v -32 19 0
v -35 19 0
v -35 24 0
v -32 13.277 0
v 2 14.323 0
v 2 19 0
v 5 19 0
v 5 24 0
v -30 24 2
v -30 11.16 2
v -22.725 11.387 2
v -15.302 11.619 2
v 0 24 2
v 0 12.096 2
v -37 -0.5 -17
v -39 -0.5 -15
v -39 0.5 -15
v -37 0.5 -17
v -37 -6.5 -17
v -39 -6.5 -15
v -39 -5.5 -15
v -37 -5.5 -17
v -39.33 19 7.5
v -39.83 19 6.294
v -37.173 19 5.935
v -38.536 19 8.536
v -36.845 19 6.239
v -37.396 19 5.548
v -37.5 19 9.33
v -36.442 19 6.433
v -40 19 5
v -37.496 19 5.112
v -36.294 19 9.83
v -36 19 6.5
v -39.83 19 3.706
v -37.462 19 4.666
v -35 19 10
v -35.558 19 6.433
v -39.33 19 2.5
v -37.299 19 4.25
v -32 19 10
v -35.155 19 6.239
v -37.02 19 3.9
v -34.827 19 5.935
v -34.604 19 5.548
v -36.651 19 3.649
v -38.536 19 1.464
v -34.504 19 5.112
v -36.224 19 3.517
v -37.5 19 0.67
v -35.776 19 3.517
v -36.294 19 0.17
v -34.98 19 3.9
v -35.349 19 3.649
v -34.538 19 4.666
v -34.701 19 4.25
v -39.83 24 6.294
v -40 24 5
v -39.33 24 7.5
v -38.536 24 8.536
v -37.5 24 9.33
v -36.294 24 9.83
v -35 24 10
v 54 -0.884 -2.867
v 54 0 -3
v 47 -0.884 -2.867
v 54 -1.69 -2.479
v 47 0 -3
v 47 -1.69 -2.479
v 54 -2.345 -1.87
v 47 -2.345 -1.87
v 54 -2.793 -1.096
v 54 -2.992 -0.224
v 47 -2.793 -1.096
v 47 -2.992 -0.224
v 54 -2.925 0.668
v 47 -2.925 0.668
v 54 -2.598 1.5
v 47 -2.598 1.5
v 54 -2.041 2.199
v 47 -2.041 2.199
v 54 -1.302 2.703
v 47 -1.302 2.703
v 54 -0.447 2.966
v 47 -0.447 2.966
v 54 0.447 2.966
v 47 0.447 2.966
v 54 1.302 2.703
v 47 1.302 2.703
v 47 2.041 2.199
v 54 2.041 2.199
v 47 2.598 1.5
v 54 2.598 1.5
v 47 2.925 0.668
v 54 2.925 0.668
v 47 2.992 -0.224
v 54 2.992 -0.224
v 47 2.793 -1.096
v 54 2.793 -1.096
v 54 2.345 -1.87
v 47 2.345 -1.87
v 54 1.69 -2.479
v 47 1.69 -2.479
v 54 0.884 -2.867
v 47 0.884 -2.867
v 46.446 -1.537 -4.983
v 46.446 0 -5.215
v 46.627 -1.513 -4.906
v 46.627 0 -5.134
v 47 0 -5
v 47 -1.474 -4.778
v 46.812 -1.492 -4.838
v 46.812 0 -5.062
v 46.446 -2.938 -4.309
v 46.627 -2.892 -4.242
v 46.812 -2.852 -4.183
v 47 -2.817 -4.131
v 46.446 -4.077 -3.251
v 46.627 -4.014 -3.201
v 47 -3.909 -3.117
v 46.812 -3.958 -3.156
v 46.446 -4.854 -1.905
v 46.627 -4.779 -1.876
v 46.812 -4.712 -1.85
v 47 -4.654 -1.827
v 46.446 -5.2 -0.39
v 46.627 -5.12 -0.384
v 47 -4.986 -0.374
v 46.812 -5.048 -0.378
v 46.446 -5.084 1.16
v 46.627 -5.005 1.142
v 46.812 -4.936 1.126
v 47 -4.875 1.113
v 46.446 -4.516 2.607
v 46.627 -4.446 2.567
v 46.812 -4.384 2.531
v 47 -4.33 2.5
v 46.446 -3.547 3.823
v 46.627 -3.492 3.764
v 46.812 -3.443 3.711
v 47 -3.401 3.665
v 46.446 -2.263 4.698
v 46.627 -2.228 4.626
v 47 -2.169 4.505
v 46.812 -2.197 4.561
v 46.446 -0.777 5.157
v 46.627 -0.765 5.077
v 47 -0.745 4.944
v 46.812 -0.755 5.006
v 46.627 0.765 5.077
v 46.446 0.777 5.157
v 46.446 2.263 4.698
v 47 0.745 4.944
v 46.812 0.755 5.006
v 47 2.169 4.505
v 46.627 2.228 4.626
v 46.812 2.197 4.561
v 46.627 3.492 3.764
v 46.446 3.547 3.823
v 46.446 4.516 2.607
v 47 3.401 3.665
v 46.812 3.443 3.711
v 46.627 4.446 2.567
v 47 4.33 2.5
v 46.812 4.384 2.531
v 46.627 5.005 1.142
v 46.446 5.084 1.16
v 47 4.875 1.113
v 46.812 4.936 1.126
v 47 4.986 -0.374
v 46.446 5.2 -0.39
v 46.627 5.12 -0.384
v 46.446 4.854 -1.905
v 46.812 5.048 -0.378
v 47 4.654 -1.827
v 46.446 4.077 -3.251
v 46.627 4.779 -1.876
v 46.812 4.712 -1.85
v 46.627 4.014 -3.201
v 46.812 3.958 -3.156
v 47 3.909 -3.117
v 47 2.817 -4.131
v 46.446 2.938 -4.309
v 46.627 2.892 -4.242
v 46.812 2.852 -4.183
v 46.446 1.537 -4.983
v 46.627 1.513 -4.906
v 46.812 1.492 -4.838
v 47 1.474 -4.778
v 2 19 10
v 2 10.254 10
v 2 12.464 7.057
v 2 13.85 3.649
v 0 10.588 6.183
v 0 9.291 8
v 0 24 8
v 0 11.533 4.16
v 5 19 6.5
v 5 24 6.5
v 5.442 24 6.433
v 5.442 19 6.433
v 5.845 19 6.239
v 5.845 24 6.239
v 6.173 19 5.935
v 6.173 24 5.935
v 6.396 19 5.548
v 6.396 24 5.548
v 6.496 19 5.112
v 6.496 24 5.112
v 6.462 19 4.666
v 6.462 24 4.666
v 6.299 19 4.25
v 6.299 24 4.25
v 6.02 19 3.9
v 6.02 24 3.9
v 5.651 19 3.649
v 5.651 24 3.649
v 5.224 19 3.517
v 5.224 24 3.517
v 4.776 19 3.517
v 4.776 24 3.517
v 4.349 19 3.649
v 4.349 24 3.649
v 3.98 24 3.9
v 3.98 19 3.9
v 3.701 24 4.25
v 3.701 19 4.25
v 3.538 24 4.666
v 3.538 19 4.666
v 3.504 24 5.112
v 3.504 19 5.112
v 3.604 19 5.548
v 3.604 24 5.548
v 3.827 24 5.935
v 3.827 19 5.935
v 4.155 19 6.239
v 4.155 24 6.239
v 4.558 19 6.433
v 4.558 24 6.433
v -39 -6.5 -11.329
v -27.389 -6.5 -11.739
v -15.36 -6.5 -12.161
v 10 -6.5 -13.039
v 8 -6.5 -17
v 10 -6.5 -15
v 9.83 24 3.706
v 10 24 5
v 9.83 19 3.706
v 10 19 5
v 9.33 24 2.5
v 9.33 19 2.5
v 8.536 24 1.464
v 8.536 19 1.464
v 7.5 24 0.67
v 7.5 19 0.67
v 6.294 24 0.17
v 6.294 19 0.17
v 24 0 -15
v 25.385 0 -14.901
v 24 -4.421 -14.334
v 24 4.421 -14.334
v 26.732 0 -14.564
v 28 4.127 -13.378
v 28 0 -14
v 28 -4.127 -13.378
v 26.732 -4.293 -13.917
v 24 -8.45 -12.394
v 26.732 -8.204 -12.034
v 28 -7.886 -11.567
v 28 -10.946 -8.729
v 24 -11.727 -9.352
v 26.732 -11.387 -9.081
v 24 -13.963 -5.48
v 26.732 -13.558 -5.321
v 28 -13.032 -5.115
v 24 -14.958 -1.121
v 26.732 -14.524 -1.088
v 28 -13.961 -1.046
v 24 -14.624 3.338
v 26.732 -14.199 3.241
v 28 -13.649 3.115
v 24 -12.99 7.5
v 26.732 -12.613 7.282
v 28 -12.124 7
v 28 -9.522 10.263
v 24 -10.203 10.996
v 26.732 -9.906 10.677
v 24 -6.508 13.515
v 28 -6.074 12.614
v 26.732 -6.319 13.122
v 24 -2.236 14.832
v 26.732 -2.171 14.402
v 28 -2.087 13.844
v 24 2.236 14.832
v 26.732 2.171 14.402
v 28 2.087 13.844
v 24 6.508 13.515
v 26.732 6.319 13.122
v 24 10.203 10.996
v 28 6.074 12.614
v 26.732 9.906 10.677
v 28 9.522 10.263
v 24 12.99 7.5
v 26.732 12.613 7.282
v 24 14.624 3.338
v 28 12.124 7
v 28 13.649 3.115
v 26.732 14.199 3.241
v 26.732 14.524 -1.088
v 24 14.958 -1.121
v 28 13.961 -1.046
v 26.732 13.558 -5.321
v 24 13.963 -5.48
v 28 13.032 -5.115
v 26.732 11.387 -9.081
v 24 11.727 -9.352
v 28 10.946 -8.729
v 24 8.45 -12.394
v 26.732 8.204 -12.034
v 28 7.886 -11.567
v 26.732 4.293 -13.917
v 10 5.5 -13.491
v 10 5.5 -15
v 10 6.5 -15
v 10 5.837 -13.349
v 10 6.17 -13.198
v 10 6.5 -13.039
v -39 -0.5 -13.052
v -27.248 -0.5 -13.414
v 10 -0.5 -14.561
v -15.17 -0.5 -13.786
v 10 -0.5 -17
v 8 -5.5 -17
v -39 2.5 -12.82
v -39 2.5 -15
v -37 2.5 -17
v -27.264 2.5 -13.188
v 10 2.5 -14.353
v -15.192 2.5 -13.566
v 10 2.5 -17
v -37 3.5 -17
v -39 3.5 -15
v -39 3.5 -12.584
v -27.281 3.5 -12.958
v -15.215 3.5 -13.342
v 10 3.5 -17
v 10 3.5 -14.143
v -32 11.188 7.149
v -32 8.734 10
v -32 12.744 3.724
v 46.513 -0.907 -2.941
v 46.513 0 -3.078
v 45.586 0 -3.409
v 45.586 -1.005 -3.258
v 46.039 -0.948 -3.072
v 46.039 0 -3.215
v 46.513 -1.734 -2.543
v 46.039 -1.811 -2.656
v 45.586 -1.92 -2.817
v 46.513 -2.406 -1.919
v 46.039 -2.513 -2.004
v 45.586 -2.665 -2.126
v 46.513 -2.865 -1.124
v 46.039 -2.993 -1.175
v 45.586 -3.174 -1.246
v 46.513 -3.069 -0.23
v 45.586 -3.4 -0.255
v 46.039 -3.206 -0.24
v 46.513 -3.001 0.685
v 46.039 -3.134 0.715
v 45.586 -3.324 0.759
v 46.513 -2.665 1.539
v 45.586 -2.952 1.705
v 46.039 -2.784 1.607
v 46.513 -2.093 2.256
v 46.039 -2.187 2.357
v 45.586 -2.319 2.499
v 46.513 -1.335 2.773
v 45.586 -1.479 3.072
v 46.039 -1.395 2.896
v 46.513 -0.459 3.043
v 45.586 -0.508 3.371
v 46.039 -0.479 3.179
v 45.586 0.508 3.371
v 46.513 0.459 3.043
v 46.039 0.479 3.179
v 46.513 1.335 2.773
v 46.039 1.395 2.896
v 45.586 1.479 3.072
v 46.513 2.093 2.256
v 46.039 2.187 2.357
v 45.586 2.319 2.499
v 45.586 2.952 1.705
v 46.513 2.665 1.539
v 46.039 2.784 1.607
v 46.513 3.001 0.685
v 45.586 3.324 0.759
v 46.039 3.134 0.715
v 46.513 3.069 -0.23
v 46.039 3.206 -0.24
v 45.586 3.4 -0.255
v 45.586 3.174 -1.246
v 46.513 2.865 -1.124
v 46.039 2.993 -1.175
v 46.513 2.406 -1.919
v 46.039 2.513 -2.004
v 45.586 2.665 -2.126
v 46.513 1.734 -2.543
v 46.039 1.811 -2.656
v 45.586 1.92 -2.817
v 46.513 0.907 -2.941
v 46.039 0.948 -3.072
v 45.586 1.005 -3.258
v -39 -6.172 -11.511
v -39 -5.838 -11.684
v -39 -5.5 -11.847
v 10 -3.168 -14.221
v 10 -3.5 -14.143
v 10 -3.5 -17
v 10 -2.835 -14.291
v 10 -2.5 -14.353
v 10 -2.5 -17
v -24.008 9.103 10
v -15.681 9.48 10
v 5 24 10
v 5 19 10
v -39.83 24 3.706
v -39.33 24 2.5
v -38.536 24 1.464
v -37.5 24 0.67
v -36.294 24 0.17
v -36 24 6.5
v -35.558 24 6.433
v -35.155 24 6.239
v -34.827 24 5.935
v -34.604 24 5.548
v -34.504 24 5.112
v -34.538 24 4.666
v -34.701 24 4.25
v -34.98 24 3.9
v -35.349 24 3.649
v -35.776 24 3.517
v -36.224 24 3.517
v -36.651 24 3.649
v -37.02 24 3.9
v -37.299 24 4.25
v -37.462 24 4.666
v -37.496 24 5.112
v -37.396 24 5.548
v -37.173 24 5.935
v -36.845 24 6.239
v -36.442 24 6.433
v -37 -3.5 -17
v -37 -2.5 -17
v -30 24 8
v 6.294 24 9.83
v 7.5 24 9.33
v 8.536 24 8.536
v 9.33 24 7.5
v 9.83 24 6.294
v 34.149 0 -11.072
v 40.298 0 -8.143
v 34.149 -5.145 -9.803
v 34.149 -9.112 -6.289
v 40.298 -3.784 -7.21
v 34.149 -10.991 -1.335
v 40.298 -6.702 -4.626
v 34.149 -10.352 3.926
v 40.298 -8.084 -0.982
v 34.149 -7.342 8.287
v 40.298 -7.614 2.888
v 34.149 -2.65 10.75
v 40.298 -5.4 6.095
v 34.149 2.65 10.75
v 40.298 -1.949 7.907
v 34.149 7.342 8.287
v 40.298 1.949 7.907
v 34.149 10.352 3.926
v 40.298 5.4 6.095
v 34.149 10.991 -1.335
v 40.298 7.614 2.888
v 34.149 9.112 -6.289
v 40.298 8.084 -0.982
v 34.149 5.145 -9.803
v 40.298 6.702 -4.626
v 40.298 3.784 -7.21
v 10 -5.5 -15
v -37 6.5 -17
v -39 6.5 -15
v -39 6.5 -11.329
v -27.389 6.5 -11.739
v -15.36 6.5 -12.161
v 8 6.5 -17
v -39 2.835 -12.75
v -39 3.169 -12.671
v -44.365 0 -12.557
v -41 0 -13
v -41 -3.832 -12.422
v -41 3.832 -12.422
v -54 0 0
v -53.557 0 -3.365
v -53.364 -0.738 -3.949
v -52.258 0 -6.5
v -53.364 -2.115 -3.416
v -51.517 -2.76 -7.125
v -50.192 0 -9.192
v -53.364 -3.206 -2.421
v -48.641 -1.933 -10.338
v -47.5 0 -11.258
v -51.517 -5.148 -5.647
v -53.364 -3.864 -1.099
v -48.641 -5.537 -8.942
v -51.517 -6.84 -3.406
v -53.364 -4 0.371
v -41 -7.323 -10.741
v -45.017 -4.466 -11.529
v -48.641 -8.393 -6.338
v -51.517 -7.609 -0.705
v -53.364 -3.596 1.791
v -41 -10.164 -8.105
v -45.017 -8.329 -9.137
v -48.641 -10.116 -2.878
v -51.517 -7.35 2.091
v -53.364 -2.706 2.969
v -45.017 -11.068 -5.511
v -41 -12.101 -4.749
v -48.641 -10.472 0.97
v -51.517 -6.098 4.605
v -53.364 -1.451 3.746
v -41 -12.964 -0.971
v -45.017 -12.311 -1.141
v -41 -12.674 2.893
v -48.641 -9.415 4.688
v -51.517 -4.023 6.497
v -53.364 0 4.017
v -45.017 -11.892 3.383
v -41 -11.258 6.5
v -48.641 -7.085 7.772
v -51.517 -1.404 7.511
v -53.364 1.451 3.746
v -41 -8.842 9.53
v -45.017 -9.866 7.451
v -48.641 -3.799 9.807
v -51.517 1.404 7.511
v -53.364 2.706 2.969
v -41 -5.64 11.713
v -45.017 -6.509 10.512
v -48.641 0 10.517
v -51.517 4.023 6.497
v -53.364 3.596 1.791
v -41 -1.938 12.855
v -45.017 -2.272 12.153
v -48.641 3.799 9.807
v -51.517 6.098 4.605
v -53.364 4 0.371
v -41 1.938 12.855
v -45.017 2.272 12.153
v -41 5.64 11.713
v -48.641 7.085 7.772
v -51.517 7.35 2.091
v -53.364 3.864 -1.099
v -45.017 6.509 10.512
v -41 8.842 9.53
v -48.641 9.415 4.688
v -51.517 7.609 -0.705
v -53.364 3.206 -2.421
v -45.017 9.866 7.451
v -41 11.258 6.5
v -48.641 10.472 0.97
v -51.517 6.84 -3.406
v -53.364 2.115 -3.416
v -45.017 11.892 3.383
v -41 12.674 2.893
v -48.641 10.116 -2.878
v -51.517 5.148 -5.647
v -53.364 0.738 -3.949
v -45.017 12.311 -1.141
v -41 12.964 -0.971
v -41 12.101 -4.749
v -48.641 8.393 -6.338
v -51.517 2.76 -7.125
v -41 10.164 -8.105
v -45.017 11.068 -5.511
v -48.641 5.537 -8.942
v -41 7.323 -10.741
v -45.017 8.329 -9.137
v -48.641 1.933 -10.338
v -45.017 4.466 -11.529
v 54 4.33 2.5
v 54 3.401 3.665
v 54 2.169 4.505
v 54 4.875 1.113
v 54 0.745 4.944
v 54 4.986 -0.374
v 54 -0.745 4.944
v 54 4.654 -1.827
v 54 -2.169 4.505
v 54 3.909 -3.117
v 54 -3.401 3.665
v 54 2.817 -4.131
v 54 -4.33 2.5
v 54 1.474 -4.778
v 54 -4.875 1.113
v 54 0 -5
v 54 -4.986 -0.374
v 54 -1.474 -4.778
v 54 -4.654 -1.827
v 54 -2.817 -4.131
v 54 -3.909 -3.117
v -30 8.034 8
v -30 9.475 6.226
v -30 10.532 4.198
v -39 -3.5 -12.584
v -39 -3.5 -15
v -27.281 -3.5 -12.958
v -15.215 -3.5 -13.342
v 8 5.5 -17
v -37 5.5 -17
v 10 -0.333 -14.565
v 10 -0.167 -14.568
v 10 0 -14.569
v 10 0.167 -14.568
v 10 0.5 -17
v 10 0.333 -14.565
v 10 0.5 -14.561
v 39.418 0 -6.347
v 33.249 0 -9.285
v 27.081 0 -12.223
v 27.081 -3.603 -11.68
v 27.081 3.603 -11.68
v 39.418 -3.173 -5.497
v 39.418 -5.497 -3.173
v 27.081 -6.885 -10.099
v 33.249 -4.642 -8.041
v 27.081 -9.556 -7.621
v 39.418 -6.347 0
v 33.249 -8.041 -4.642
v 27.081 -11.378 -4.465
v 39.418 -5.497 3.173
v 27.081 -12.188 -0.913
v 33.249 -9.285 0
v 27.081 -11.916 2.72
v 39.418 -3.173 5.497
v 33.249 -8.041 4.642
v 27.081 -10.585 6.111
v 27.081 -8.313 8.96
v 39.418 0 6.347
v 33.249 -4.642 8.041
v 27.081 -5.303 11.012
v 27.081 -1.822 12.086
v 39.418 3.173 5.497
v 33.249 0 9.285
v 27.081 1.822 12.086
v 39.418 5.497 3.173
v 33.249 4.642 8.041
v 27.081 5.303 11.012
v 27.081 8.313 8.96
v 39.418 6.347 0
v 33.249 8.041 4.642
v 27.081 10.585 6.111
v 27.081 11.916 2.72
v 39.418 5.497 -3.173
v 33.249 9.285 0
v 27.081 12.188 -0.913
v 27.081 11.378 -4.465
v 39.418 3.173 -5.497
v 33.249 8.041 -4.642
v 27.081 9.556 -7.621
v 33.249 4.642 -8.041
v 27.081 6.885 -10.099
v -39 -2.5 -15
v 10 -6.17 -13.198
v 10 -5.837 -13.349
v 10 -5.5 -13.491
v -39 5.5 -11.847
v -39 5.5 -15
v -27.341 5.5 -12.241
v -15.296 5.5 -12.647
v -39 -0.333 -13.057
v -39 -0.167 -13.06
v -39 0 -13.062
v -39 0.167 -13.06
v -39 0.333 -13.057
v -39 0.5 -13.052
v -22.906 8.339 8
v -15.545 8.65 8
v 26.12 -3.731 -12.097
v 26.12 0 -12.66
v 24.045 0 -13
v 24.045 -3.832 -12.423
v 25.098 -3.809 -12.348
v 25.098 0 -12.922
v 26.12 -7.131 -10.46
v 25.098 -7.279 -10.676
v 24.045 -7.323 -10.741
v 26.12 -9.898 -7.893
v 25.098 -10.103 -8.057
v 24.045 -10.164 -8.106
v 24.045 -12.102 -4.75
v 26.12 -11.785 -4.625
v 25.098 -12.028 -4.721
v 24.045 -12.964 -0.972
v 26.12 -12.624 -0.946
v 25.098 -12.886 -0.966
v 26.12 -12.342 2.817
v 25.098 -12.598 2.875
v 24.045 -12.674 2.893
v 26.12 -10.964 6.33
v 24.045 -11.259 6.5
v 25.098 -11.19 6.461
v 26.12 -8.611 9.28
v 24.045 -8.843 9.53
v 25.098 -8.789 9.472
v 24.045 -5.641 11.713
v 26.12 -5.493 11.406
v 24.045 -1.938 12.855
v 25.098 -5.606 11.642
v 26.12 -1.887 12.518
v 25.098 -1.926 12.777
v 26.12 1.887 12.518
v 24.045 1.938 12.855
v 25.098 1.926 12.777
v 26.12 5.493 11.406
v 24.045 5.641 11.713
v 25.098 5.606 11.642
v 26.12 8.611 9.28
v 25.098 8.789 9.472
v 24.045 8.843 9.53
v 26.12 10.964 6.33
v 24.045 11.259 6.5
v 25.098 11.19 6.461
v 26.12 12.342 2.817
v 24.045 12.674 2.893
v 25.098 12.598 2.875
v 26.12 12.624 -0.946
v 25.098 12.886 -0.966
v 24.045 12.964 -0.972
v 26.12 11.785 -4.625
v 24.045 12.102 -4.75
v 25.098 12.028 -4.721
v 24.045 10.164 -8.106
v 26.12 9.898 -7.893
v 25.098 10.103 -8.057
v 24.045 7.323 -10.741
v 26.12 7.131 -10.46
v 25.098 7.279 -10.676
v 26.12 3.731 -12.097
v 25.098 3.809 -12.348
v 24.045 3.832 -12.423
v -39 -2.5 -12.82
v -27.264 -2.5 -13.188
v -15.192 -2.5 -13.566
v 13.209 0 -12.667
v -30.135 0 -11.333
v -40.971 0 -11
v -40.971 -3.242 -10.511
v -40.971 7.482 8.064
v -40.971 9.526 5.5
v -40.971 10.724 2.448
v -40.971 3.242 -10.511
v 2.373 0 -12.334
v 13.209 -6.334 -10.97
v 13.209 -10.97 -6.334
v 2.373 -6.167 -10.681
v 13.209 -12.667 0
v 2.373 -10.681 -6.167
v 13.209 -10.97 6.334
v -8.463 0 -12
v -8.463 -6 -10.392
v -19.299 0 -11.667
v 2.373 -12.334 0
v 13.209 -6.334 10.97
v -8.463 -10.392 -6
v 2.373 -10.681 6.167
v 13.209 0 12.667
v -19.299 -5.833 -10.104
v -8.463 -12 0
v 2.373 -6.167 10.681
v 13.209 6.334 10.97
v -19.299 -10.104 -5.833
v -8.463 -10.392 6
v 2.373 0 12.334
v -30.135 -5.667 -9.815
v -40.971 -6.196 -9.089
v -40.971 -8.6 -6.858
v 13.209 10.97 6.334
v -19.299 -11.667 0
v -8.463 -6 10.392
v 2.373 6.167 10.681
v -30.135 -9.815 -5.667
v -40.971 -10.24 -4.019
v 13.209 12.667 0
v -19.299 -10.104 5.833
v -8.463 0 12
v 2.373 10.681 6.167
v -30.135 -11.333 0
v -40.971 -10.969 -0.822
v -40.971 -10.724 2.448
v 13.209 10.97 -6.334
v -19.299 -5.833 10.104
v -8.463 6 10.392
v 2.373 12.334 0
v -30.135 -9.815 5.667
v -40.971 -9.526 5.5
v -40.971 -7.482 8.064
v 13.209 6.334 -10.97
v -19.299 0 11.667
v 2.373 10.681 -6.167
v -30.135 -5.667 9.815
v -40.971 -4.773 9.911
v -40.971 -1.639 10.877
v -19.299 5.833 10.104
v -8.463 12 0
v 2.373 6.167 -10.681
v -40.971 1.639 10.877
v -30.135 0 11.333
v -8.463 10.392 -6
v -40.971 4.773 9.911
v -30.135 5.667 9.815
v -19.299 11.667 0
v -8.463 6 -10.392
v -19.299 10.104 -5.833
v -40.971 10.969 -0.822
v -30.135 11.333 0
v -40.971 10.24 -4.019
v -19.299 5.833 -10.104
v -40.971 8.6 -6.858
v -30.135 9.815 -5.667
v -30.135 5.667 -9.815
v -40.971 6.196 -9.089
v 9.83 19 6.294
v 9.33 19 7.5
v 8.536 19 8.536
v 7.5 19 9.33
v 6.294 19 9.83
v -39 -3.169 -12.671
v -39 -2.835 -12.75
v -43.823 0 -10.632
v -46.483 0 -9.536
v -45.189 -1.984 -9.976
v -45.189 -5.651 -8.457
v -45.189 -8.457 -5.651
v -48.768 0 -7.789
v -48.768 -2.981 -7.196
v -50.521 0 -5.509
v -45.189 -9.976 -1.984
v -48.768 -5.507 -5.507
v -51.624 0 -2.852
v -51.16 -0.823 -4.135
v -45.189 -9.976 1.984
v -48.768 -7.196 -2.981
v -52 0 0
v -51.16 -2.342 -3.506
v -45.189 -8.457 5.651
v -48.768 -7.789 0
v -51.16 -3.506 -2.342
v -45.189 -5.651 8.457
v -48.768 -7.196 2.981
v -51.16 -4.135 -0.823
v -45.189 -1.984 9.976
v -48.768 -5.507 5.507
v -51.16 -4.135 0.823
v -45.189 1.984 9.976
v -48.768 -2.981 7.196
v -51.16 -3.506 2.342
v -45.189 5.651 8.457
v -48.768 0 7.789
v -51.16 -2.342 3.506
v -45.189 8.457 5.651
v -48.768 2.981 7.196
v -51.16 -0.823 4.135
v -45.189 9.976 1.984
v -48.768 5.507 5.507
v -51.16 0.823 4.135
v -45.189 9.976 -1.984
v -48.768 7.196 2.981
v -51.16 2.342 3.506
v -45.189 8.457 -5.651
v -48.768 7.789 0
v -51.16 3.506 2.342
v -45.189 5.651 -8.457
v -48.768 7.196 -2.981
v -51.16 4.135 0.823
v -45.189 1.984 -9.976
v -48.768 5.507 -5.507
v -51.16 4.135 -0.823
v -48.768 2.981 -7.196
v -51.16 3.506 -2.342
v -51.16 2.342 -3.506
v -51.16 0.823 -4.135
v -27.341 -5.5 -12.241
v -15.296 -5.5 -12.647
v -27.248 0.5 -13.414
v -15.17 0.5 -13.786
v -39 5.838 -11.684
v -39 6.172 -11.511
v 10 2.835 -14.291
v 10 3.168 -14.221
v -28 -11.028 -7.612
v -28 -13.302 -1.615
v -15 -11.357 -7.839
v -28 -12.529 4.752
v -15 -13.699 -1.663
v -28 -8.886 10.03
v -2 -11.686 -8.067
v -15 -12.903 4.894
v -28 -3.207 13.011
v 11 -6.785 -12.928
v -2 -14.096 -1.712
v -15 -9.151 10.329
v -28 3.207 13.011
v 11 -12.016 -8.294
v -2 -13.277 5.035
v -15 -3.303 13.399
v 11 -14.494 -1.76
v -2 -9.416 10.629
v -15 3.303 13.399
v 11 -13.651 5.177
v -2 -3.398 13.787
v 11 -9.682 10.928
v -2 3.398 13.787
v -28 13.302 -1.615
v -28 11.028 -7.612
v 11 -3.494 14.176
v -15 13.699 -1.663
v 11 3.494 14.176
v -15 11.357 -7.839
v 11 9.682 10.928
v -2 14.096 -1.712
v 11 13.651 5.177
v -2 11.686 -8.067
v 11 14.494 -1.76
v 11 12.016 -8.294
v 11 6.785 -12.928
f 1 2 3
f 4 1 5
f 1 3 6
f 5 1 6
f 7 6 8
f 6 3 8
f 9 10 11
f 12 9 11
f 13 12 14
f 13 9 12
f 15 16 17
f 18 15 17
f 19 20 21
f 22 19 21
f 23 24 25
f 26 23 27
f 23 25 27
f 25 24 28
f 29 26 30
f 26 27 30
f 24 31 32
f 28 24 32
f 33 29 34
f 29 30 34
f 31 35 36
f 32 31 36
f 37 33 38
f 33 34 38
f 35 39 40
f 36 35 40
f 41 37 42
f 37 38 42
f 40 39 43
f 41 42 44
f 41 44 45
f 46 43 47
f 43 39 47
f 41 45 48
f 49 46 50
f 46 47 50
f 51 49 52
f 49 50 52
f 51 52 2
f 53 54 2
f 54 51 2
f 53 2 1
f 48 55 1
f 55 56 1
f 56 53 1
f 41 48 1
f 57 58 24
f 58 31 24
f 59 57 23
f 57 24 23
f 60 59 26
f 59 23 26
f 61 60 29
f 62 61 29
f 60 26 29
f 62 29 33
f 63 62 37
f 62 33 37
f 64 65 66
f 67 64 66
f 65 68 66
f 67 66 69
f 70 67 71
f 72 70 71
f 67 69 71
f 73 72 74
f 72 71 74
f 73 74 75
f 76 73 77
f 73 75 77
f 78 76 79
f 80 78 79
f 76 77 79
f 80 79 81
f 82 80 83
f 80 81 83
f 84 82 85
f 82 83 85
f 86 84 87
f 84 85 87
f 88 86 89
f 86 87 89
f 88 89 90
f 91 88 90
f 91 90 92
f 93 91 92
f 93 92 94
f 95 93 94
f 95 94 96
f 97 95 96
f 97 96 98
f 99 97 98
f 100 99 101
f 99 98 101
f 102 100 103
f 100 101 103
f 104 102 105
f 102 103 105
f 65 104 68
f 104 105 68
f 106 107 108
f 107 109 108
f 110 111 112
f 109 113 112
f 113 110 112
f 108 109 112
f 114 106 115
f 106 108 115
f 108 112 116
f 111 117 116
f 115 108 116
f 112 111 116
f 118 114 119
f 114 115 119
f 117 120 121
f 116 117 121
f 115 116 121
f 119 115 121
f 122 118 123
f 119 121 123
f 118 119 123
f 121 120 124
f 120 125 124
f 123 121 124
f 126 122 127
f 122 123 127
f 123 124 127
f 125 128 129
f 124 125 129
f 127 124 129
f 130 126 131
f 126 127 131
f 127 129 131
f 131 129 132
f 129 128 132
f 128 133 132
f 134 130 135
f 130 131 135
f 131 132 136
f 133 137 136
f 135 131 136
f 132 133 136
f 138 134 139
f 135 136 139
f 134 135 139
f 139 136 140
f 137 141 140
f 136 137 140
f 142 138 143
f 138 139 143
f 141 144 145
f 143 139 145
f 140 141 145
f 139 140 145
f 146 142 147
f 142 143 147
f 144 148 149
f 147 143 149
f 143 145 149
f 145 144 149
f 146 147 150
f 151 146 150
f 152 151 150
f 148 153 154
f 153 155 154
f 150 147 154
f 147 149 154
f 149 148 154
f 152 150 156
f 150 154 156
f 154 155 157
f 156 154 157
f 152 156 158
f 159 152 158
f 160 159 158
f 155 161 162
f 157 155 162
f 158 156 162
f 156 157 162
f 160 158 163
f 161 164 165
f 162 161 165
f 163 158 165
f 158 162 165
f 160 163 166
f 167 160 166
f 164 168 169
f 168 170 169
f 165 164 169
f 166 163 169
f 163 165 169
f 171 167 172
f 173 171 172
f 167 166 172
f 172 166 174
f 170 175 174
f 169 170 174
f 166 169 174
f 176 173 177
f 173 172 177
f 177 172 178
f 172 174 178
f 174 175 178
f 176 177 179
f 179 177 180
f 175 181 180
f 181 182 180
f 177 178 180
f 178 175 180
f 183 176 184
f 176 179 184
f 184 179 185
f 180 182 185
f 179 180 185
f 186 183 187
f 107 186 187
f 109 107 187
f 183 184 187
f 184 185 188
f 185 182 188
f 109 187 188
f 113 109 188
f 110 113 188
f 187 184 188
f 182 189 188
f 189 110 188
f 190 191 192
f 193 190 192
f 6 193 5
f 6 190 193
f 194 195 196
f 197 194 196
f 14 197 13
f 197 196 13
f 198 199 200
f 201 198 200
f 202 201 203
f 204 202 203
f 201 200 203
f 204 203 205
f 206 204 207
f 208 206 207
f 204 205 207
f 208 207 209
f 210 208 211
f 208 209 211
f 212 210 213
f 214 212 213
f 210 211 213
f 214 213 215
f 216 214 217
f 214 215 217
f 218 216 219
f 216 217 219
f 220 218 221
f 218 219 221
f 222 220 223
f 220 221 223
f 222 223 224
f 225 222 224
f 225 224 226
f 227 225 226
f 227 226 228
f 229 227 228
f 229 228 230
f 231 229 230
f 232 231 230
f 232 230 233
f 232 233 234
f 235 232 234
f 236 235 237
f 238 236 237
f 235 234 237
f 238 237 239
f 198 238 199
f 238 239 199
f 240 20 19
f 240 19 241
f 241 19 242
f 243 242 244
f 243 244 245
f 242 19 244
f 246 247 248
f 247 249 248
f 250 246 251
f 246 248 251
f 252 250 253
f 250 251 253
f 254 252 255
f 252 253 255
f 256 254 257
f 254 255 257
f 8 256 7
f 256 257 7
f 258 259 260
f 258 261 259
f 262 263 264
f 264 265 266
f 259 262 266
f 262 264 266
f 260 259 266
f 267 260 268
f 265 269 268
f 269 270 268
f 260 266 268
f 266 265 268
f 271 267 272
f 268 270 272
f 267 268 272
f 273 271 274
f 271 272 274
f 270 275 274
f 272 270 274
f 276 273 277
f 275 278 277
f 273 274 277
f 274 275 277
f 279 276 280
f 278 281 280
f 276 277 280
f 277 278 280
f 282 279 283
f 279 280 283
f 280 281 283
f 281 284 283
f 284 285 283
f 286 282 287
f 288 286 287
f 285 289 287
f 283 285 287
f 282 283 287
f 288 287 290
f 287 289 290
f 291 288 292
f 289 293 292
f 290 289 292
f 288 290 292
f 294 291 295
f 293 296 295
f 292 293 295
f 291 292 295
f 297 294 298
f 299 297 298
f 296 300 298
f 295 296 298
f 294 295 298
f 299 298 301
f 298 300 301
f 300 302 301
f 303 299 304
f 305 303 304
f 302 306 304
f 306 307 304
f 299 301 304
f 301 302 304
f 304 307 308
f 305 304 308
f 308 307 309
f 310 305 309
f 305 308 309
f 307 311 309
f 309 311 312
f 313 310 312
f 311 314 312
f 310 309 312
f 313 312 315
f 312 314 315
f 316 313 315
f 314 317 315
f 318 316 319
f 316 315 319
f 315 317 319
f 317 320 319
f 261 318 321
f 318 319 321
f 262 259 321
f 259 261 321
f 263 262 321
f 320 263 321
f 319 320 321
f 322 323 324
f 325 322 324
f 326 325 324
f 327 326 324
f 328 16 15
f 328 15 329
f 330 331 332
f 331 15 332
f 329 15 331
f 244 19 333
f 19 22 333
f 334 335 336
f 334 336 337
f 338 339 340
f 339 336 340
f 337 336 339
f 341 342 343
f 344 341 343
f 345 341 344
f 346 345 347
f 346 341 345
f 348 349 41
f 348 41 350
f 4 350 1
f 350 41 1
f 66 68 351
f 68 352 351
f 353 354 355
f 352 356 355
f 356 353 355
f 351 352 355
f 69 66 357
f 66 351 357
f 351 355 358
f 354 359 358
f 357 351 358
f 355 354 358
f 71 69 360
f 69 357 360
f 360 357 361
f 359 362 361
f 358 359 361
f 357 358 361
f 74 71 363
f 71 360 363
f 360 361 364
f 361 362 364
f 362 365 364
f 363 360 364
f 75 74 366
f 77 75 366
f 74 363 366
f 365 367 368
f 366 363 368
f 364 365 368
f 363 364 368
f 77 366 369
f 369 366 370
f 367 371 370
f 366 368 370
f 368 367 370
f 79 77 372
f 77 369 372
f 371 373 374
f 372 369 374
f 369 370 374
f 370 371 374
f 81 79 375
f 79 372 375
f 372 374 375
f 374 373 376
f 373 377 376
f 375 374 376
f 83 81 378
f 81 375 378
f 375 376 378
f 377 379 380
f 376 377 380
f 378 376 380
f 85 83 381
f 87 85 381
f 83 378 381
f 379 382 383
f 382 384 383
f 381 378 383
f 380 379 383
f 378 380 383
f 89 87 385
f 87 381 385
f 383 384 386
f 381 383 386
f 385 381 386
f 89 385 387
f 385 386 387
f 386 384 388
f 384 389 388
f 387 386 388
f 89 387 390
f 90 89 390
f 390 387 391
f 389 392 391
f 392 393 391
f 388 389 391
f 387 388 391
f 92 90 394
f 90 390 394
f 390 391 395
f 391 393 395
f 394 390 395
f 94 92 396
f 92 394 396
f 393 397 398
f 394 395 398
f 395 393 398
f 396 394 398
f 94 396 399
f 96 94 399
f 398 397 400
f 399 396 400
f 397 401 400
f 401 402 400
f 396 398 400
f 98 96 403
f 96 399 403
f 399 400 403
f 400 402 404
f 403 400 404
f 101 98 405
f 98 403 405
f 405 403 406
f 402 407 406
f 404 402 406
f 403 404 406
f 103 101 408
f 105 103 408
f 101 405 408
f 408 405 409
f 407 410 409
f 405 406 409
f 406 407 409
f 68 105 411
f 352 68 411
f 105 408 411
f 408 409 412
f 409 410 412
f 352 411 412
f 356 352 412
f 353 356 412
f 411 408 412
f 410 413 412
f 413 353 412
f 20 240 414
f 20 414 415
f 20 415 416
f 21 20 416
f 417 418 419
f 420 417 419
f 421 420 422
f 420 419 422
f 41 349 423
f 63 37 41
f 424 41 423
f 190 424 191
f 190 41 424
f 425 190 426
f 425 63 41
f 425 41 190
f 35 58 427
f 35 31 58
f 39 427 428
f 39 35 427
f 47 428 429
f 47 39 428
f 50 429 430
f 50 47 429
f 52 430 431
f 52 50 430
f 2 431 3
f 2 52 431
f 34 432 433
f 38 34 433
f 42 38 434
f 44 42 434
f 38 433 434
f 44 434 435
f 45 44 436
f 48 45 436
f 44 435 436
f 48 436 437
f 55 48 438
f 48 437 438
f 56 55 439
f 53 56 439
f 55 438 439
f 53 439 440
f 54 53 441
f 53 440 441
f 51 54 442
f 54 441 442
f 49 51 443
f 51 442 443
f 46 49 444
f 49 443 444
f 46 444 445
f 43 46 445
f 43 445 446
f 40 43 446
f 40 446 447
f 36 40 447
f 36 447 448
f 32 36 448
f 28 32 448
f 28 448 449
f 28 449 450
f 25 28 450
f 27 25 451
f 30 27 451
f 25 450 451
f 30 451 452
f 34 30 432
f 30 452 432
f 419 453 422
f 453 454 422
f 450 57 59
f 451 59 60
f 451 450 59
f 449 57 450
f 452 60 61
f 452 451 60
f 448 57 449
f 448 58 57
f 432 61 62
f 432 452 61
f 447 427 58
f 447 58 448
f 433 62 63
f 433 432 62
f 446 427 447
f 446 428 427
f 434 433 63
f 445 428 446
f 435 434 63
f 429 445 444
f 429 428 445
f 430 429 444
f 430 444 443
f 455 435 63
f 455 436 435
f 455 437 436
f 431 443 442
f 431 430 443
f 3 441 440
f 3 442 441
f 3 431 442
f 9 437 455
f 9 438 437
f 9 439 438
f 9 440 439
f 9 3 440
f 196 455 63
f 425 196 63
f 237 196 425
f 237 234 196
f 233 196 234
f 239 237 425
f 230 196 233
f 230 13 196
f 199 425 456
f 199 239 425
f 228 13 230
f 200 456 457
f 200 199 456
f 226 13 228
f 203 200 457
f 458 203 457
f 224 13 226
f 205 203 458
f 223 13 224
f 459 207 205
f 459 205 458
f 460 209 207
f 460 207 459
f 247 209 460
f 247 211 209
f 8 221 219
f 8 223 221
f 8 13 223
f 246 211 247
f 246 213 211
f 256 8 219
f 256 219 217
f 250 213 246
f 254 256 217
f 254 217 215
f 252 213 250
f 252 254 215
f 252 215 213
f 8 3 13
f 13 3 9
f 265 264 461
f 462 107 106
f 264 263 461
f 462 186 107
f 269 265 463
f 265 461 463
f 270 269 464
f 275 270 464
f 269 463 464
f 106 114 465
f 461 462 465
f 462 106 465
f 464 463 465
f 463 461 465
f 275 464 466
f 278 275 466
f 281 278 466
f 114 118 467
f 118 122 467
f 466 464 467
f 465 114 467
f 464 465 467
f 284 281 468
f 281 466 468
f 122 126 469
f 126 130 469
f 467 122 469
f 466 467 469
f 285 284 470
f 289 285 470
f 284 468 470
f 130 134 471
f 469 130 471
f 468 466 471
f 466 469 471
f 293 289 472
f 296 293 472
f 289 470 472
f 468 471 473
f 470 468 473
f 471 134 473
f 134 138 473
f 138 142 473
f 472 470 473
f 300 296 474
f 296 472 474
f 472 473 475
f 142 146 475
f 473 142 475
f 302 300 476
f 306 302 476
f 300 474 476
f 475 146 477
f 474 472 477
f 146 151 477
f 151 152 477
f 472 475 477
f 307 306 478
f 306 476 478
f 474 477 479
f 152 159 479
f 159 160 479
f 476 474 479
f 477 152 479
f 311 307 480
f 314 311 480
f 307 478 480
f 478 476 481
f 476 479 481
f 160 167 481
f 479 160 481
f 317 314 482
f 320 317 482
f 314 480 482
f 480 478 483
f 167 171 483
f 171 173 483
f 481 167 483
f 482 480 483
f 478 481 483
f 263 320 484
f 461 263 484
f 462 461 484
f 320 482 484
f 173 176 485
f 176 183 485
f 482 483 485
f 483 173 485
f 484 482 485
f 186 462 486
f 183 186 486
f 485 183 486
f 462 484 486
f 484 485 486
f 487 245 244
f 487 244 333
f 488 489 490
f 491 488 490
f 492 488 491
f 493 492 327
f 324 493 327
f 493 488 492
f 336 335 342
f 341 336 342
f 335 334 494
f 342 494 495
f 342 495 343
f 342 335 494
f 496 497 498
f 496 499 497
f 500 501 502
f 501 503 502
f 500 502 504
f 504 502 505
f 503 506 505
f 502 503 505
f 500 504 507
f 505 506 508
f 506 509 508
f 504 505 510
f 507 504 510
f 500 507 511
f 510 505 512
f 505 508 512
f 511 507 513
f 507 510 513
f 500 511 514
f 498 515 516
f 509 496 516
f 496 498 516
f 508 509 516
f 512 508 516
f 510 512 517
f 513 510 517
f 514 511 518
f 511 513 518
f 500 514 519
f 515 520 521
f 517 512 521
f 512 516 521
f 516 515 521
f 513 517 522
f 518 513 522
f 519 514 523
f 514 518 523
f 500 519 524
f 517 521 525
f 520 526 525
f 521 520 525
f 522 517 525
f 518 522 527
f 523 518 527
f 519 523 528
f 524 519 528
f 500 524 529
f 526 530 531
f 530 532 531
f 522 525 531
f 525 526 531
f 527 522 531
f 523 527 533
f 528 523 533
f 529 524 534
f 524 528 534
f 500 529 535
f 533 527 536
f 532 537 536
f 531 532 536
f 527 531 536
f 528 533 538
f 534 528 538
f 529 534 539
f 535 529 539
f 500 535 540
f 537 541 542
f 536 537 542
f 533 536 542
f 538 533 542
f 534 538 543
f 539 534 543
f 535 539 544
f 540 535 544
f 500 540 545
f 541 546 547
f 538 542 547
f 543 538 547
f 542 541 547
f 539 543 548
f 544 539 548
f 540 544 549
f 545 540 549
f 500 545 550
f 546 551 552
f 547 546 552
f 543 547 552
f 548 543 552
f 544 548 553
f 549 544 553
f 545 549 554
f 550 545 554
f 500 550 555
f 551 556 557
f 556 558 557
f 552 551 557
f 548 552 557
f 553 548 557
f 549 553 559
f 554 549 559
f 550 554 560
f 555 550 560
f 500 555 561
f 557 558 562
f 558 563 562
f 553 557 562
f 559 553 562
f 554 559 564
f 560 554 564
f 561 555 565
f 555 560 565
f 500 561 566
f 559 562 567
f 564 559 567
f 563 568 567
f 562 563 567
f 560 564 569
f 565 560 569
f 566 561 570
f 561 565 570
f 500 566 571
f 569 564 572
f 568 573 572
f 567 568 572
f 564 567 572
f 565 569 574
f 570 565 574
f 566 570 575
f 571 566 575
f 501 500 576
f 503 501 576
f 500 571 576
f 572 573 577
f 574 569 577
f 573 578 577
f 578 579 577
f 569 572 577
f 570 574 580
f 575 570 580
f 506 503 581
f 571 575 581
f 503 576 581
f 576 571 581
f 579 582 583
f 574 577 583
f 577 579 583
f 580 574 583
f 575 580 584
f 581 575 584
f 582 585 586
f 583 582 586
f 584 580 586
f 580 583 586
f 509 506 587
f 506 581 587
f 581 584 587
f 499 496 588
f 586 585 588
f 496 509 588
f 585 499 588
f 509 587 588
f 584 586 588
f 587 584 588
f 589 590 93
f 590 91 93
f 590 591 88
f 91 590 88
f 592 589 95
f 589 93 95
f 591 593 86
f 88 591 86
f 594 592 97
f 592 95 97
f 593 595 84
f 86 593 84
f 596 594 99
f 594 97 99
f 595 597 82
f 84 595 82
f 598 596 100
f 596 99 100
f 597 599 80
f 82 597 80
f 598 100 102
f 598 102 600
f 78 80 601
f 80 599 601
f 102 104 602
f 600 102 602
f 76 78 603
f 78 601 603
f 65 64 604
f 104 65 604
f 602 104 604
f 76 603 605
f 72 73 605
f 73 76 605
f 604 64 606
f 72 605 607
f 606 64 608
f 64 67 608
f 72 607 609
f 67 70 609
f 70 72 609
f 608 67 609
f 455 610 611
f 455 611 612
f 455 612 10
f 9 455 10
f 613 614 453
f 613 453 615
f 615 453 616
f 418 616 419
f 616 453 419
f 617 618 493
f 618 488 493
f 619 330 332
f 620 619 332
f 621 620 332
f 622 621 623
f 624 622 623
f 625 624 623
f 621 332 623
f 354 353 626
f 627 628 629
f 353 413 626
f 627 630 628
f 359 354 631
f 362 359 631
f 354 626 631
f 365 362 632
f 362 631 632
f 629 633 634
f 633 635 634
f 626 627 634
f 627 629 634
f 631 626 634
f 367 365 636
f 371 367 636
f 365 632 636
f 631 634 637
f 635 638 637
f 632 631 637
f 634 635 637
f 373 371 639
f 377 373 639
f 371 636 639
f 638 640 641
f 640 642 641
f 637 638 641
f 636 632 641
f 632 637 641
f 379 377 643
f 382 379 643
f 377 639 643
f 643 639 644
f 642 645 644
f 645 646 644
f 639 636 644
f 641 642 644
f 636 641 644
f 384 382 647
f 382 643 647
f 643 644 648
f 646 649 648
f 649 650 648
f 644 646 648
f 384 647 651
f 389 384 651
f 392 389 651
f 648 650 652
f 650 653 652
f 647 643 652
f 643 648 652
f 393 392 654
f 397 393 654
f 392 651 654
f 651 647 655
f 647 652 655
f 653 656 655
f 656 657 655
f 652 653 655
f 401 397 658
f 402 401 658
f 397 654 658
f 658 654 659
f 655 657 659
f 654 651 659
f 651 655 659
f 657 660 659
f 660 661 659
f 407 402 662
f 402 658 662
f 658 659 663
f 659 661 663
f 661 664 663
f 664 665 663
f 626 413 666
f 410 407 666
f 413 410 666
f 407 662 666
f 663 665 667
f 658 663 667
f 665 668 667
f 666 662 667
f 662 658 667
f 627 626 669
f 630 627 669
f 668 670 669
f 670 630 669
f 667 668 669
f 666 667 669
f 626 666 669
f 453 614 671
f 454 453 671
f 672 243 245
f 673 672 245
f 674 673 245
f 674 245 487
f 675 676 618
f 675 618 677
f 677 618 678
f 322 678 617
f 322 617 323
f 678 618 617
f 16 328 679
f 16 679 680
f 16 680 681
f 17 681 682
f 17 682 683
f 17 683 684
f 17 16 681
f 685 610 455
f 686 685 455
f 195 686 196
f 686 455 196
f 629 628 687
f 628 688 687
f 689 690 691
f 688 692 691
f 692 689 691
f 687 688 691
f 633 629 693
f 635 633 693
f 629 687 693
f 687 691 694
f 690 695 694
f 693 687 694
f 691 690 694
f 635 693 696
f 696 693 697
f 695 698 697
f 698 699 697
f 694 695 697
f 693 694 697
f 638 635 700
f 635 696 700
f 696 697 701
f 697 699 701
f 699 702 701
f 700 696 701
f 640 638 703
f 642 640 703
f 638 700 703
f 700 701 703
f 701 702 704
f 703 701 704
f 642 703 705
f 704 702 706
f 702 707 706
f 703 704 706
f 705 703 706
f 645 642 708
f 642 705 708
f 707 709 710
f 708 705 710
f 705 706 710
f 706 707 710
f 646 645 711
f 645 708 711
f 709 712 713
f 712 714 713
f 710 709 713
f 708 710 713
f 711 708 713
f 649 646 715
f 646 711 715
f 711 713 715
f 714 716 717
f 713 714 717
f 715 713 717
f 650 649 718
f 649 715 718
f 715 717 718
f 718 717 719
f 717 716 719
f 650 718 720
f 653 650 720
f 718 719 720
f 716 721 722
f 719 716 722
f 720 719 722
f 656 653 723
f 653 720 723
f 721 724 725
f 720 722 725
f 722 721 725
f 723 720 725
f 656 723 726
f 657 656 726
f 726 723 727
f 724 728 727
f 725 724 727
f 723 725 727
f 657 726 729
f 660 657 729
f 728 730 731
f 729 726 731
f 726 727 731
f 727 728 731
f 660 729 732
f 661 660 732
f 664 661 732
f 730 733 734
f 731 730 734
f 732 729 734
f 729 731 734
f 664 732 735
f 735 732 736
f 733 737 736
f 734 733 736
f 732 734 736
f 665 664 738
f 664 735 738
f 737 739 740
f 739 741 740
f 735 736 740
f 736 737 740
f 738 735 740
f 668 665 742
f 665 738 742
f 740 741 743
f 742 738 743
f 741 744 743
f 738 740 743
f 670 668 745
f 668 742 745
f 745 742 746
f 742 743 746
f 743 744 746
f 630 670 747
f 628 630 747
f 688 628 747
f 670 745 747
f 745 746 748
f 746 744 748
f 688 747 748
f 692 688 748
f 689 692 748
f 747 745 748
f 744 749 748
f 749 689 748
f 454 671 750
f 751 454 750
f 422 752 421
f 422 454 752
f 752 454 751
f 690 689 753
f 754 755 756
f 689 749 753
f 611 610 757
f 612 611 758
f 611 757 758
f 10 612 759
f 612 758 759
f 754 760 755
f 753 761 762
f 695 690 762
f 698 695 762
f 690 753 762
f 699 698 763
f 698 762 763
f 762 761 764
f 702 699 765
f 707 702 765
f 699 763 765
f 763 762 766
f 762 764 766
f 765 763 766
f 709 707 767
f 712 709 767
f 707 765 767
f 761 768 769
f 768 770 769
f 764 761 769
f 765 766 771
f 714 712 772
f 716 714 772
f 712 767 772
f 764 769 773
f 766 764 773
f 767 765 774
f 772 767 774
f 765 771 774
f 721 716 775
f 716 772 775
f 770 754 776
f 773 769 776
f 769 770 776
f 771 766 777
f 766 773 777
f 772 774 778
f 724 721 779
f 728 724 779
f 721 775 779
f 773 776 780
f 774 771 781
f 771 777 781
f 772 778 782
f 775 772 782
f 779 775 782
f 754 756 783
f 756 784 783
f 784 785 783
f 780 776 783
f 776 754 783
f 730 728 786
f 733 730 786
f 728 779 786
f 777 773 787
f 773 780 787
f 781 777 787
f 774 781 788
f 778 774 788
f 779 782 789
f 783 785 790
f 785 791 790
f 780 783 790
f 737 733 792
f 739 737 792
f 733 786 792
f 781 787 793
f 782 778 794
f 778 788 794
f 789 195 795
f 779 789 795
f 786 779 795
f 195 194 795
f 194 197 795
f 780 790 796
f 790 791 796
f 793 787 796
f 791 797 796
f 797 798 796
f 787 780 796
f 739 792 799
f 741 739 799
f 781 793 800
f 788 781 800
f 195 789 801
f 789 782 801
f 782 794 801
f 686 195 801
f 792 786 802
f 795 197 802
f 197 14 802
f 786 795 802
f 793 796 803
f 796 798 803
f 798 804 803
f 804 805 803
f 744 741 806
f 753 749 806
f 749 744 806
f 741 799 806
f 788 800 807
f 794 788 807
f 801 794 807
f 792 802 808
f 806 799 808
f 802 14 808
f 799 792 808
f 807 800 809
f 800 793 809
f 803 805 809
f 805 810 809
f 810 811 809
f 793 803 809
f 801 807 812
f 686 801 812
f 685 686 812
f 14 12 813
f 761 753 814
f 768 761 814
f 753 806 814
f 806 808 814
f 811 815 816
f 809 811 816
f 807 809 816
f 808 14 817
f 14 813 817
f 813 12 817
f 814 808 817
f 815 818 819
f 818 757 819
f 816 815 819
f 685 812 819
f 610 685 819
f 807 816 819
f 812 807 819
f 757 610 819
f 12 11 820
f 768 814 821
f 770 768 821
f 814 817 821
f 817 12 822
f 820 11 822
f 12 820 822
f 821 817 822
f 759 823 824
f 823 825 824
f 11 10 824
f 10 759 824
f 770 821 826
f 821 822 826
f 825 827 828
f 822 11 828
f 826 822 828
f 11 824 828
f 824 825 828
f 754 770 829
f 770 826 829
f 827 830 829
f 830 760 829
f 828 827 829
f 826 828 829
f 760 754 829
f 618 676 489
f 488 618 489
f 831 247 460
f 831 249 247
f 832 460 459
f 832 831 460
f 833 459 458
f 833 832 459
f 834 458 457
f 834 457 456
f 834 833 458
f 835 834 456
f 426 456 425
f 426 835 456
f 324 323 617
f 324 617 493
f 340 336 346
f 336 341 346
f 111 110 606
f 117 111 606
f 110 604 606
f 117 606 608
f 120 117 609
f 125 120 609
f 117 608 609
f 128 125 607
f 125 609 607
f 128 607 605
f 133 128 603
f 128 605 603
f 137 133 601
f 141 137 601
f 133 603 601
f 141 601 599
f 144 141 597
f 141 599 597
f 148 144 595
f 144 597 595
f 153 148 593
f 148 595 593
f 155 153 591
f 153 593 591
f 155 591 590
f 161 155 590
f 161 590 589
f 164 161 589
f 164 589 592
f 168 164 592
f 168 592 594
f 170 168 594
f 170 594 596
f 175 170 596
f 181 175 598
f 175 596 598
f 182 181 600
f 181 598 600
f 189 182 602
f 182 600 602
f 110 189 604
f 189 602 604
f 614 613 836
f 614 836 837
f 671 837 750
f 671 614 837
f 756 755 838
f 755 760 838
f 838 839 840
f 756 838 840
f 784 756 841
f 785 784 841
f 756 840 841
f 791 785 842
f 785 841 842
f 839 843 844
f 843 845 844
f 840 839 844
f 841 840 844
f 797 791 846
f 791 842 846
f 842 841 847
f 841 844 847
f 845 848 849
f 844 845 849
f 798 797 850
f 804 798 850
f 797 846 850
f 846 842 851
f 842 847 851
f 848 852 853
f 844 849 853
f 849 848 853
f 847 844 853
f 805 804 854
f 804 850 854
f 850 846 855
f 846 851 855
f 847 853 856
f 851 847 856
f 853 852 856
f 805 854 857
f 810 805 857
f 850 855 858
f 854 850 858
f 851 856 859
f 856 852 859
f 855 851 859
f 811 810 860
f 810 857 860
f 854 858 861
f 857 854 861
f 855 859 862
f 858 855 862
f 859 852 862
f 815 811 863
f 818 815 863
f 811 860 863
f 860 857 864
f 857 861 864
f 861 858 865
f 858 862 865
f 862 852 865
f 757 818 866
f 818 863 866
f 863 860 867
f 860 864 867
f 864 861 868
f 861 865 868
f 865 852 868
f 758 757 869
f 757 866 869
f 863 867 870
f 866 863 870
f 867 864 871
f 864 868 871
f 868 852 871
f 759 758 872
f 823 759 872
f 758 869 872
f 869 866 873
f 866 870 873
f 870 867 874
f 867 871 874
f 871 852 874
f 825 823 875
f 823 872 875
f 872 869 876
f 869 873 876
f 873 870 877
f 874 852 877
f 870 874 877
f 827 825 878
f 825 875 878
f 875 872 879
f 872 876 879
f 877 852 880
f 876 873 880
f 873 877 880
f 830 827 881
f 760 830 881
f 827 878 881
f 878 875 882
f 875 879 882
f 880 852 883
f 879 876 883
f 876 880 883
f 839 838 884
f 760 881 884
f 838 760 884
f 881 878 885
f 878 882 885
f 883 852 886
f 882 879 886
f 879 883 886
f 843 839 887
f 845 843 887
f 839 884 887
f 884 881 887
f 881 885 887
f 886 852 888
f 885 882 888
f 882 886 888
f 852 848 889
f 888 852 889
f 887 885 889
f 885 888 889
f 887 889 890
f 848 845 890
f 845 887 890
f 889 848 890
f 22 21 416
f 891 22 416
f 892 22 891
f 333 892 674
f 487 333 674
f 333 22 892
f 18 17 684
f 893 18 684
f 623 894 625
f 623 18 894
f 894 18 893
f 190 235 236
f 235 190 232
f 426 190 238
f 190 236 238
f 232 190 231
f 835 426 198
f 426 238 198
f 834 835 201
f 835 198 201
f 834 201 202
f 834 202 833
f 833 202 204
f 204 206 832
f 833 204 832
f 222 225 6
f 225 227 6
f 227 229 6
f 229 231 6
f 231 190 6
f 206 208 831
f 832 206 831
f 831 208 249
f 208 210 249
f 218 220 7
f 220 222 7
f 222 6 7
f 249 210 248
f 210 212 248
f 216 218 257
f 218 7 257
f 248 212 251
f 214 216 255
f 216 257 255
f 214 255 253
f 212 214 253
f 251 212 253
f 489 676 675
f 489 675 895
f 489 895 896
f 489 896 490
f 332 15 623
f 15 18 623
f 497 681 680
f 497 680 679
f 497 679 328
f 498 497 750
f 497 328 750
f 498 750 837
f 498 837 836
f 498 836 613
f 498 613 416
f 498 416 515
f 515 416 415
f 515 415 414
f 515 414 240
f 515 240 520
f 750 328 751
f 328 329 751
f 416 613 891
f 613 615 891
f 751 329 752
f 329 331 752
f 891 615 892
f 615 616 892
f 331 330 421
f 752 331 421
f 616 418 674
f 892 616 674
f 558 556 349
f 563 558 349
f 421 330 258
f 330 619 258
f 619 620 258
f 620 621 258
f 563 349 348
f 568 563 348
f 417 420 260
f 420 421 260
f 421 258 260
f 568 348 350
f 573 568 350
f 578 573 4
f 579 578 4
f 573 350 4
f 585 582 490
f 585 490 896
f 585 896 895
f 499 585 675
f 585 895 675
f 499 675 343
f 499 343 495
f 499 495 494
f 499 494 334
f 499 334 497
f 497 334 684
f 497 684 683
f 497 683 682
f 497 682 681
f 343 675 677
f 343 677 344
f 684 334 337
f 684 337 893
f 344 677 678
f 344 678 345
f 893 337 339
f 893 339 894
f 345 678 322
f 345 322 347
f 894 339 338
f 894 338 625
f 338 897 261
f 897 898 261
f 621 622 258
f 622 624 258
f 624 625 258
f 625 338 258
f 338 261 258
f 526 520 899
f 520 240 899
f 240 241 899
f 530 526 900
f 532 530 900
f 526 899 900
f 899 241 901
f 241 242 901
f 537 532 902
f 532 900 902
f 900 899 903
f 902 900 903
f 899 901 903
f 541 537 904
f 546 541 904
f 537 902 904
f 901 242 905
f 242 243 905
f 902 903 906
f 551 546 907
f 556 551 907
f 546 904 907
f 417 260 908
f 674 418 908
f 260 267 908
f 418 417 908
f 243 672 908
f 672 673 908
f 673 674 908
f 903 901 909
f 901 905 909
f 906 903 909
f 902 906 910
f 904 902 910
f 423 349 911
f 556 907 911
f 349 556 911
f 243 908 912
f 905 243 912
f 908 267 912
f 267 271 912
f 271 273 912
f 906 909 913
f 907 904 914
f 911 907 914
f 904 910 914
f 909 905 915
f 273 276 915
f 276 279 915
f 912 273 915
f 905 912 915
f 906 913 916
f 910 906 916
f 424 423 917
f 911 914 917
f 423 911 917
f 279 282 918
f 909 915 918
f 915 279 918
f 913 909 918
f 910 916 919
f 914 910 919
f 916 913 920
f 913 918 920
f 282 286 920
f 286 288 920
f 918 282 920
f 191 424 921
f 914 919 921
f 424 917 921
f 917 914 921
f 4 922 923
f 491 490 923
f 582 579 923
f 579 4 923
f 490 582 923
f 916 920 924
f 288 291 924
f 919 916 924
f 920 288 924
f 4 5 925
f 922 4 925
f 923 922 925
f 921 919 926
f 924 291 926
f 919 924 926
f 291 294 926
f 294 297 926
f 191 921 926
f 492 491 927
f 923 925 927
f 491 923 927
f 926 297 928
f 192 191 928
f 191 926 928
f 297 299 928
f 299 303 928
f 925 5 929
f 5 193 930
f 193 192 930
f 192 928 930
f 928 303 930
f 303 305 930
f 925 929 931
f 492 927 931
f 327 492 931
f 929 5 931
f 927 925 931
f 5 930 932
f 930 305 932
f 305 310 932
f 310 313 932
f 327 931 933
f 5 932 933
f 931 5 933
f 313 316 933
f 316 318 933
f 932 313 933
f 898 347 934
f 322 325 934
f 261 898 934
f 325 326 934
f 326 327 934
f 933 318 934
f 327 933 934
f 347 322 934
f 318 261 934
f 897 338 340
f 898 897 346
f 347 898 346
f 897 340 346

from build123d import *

# Parameters (mm, degrees)
BOSS_EXTRUDE1_REACH = 70.28
SKETCH2_W           = 34
SKETCH2_H           = 10
SKETCH2_W_2         = 30
SKETCH2_H_2         = 6
SKETCH4_W           = 30
SKETCH4_H           = 6
CUT_EXTRUDE4_DEPTH  = 20
SKETCH5_W           = 50
SKETCH5_H           = 10
SKETCH5_R           = 1.5
SKETCH5_W_2         = 30
SKETCH5_H_2         = 6
BOSS_EXTRUDE2_DEPTH = 5
FILLET1_R           = 5
BOSS_EXTRUDE3_REACH = 69.202
SKETCH6_W           = 49
SKETCH6_H           = 1
CHAMFER1_SIZE       = 2


with BuildPart() as part:
    # Sketch1 → Revolve1 (revolve)
    with BuildSketch(Plane.XY, mode=Mode.PRIVATE) as revolve1_sk:
        with BuildLine():
            Line((-41, 13), (24, 15))
            ThreePointArc((24, 15), (26.065530114, 14.762120457), (28, 14))
            Line((28, 14), (46.44629603, 5.214864416))
            ThreePointArc((46.44629603, 5.214864416), (46.719154543, 5.09714106), (47, 5))
            Line((47, 5), (54, 5))
            Line((54, 5), (54, 3))
            Line((54, 3), (52, 3))
            Line((52, 3), (47, 3))
            ThreePointArc((47, 3), (46.274186419, 3.139019493), (45.586334306, 3.409188411))
            Line((45.586334306, 3.409188411), (27.080850933, 12.222512247))
            ThreePointArc((27.080850933, 12.222512247), (25.614773207, 12.813149248), (24.045329018, 13.000448217))
            Line((24.045329018, 13.000448217), (-40.970521752, 10.999960501))
            ThreePointArc((-40.970521752, 10.999960501), (-48.767745467, 7.788589754), (-52, 0))
            Line((-52, 0), (-54, 0))
            ThreePointArc((-54, 0), (-50.192388155, 9.192388155), (-41, 13))
        make_face()
    revolve(revolve1_sk.sketch.rotate(Axis((54, 0, 0), (-1, 0, 0)), 90), axis=Axis((54, 0, 0), (-1, 0, 0)))

    # Boss-Extrude1: up to this cone (the profile starts outside it)
    boss_extrude1_end = Plane(origin=(-15, 0, 0), z_dir=(1, 0, 0)) * Cone(11.197538462, 16.402461538, 169.16, mode=Mode.PRIVATE)
    # Sketch2 → Boss-Extrude1 (add, up to the surface)
    with BuildSketch(Plane(origin=(0, 24, 0), x_dir=(1, 0, 0), z_dir=(0, 1, 0)), mode=Mode.PRIVATE) as boss_extrude1_sk1:
        with Locations((-15, -5)):
            Rectangle(SKETCH2_W, SKETCH2_H)
        with Locations((-15, -5)):
            Rectangle(SKETCH2_W_2, SKETCH2_H_2, mode=Mode.SUBTRACT)
    boss_extrude1_tool1 = extrude(boss_extrude1_sk1.sketch, amount=-BOSS_EXTRUDE1_REACH, mode=Mode.PRIVATE) - boss_extrude1_end
    add(boss_extrude1_tool1.solids().sort_by_distance((-15, 24, 0.354401))[0])

    # Sketch4 → Cut-Extrude4 (cut)
    with BuildSketch(Plane(origin=(0, 24, 0), x_dir=(1, 0, 0), z_dir=(0, 1, 0))):
        with Locations((-15, -5)):
            Rectangle(SKETCH4_W, SKETCH4_H)
    extrude(amount=-CUT_EXTRUDE4_DEPTH, mode=Mode.SUBTRACT)

    # Sketch5 → Boss-Extrude2 (add)
    with BuildSketch(Plane(origin=(0, 24, 0), x_dir=(1, 0, 0), z_dir=(0, 1, 0))):
        with Locations((-15, -5)):
            Rectangle(SKETCH5_W, SKETCH5_H)
        with Locations(Location((-36, -5, 0), (0, 0, 270))):
            Circle(SKETCH5_R, mode=Mode.SUBTRACT)
        with Locations(Location((5, -5, 0), (0, 0, 270))):
            Circle(SKETCH5_R, mode=Mode.SUBTRACT)
        with Locations((-15, -5)):
            Rectangle(SKETCH5_W_2, SKETCH5_H_2, mode=Mode.SUBTRACT)
    extrude(amount=-BOSS_EXTRUDE2_DEPTH)

    # Fillet1
    fillet1_edges = [part.edges().sort_by_distance(p)[0] for p in [
        (10, 21.5, 10),
        (10, 21.5, 0),
        (-40, 21.5, 0),
        (-40, 21.5, 10),
    ]]
    fillet(fillet1_edges, radius=FILLET1_R - 0.0001)  # a hair under: the kernel refuses the full size

    # Boss-Extrude3: up to this cone (the profile starts outside it)
    boss_extrude3_end = Plane(origin=(-14.5, 0, 0), z_dir=(1, 0, 0)) * Cone(11.245618935, 16.385150296, 167.034769231, mode=Mode.PRIVATE)
    # Sketch6 → Boss-Extrude3 (add, up to the surface)
    with BuildSketch(Plane.XY.offset(-17), mode=Mode.PRIVATE) as boss_extrude3_sk1:
        with Locations((-14.5, 6)):
            Rectangle(SKETCH6_W, SKETCH6_H)
    boss_extrude3_tool1 = extrude(boss_extrude3_sk1.sketch, amount=BOSS_EXTRUDE3_REACH, mode=Mode.PRIVATE) - boss_extrude3_end
    add(boss_extrude3_tool1.solids().sort_by_distance((-14.5, 6, -17))[0])
    # Sketch6 → Boss-Extrude3 (add, up to the surface)
    with BuildSketch(Plane.XY.offset(-17), mode=Mode.PRIVATE) as boss_extrude3_sk2:
        with Locations((-14.5, 3)):
            Rectangle(SKETCH6_W, SKETCH6_H)
    boss_extrude3_tool2 = extrude(boss_extrude3_sk2.sketch, amount=BOSS_EXTRUDE3_REACH, mode=Mode.PRIVATE) - boss_extrude3_end
    add(boss_extrude3_tool2.solids().sort_by_distance((-14.5, 3, -17))[0])
    # Sketch6 → Boss-Extrude3 (add, up to the surface)
    with BuildSketch(Plane.XY.offset(-17), mode=Mode.PRIVATE) as boss_extrude3_sk3:
        with Locations((-14.5, 0)):
            Rectangle(SKETCH6_W, SKETCH6_H)
    boss_extrude3_tool3 = extrude(boss_extrude3_sk3.sketch, amount=BOSS_EXTRUDE3_REACH, mode=Mode.PRIVATE) - boss_extrude3_end
    add(boss_extrude3_tool3.solids().sort_by_distance((-14.5, 0, -17))[0])
    # Sketch6 → Boss-Extrude3 (add, up to the surface)
    with BuildSketch(Plane.XY.offset(-17), mode=Mode.PRIVATE) as boss_extrude3_sk4:
        with Locations((-14.5, -3)):
            Rectangle(SKETCH6_W, SKETCH6_H)
    boss_extrude3_tool4 = extrude(boss_extrude3_sk4.sketch, amount=BOSS_EXTRUDE3_REACH, mode=Mode.PRIVATE) - boss_extrude3_end
    add(boss_extrude3_tool4.solids().sort_by_distance((-14.5, -3, -17))[0])
    # Sketch6 → Boss-Extrude3 (add, up to the surface)
    with BuildSketch(Plane.XY.offset(-17), mode=Mode.PRIVATE) as boss_extrude3_sk5:
        with Locations((-14.5, -6)):
            Rectangle(SKETCH6_W, SKETCH6_H)
    boss_extrude3_tool5 = extrude(boss_extrude3_sk5.sketch, amount=BOSS_EXTRUDE3_REACH, mode=Mode.PRIVATE) - boss_extrude3_end
    add(boss_extrude3_tool5.solids().sort_by_distance((-14.5, -6, -17))[0])

    # Chamfer1
    chamfer1_edges = [part.edges().sort_by_distance(p)[0] for p in [
        (10, 6, -17),
        (-39, 6, -17),
        (-39, 3, -17),
        (-39, 0, -17),
        (-39, -3, -17),
        (10, -6, -17),
        (-39, -6, -17),
    ]]
    chamfer(chamfer1_edges, length=CHAMFER1_SIZE)


solid = part.part
